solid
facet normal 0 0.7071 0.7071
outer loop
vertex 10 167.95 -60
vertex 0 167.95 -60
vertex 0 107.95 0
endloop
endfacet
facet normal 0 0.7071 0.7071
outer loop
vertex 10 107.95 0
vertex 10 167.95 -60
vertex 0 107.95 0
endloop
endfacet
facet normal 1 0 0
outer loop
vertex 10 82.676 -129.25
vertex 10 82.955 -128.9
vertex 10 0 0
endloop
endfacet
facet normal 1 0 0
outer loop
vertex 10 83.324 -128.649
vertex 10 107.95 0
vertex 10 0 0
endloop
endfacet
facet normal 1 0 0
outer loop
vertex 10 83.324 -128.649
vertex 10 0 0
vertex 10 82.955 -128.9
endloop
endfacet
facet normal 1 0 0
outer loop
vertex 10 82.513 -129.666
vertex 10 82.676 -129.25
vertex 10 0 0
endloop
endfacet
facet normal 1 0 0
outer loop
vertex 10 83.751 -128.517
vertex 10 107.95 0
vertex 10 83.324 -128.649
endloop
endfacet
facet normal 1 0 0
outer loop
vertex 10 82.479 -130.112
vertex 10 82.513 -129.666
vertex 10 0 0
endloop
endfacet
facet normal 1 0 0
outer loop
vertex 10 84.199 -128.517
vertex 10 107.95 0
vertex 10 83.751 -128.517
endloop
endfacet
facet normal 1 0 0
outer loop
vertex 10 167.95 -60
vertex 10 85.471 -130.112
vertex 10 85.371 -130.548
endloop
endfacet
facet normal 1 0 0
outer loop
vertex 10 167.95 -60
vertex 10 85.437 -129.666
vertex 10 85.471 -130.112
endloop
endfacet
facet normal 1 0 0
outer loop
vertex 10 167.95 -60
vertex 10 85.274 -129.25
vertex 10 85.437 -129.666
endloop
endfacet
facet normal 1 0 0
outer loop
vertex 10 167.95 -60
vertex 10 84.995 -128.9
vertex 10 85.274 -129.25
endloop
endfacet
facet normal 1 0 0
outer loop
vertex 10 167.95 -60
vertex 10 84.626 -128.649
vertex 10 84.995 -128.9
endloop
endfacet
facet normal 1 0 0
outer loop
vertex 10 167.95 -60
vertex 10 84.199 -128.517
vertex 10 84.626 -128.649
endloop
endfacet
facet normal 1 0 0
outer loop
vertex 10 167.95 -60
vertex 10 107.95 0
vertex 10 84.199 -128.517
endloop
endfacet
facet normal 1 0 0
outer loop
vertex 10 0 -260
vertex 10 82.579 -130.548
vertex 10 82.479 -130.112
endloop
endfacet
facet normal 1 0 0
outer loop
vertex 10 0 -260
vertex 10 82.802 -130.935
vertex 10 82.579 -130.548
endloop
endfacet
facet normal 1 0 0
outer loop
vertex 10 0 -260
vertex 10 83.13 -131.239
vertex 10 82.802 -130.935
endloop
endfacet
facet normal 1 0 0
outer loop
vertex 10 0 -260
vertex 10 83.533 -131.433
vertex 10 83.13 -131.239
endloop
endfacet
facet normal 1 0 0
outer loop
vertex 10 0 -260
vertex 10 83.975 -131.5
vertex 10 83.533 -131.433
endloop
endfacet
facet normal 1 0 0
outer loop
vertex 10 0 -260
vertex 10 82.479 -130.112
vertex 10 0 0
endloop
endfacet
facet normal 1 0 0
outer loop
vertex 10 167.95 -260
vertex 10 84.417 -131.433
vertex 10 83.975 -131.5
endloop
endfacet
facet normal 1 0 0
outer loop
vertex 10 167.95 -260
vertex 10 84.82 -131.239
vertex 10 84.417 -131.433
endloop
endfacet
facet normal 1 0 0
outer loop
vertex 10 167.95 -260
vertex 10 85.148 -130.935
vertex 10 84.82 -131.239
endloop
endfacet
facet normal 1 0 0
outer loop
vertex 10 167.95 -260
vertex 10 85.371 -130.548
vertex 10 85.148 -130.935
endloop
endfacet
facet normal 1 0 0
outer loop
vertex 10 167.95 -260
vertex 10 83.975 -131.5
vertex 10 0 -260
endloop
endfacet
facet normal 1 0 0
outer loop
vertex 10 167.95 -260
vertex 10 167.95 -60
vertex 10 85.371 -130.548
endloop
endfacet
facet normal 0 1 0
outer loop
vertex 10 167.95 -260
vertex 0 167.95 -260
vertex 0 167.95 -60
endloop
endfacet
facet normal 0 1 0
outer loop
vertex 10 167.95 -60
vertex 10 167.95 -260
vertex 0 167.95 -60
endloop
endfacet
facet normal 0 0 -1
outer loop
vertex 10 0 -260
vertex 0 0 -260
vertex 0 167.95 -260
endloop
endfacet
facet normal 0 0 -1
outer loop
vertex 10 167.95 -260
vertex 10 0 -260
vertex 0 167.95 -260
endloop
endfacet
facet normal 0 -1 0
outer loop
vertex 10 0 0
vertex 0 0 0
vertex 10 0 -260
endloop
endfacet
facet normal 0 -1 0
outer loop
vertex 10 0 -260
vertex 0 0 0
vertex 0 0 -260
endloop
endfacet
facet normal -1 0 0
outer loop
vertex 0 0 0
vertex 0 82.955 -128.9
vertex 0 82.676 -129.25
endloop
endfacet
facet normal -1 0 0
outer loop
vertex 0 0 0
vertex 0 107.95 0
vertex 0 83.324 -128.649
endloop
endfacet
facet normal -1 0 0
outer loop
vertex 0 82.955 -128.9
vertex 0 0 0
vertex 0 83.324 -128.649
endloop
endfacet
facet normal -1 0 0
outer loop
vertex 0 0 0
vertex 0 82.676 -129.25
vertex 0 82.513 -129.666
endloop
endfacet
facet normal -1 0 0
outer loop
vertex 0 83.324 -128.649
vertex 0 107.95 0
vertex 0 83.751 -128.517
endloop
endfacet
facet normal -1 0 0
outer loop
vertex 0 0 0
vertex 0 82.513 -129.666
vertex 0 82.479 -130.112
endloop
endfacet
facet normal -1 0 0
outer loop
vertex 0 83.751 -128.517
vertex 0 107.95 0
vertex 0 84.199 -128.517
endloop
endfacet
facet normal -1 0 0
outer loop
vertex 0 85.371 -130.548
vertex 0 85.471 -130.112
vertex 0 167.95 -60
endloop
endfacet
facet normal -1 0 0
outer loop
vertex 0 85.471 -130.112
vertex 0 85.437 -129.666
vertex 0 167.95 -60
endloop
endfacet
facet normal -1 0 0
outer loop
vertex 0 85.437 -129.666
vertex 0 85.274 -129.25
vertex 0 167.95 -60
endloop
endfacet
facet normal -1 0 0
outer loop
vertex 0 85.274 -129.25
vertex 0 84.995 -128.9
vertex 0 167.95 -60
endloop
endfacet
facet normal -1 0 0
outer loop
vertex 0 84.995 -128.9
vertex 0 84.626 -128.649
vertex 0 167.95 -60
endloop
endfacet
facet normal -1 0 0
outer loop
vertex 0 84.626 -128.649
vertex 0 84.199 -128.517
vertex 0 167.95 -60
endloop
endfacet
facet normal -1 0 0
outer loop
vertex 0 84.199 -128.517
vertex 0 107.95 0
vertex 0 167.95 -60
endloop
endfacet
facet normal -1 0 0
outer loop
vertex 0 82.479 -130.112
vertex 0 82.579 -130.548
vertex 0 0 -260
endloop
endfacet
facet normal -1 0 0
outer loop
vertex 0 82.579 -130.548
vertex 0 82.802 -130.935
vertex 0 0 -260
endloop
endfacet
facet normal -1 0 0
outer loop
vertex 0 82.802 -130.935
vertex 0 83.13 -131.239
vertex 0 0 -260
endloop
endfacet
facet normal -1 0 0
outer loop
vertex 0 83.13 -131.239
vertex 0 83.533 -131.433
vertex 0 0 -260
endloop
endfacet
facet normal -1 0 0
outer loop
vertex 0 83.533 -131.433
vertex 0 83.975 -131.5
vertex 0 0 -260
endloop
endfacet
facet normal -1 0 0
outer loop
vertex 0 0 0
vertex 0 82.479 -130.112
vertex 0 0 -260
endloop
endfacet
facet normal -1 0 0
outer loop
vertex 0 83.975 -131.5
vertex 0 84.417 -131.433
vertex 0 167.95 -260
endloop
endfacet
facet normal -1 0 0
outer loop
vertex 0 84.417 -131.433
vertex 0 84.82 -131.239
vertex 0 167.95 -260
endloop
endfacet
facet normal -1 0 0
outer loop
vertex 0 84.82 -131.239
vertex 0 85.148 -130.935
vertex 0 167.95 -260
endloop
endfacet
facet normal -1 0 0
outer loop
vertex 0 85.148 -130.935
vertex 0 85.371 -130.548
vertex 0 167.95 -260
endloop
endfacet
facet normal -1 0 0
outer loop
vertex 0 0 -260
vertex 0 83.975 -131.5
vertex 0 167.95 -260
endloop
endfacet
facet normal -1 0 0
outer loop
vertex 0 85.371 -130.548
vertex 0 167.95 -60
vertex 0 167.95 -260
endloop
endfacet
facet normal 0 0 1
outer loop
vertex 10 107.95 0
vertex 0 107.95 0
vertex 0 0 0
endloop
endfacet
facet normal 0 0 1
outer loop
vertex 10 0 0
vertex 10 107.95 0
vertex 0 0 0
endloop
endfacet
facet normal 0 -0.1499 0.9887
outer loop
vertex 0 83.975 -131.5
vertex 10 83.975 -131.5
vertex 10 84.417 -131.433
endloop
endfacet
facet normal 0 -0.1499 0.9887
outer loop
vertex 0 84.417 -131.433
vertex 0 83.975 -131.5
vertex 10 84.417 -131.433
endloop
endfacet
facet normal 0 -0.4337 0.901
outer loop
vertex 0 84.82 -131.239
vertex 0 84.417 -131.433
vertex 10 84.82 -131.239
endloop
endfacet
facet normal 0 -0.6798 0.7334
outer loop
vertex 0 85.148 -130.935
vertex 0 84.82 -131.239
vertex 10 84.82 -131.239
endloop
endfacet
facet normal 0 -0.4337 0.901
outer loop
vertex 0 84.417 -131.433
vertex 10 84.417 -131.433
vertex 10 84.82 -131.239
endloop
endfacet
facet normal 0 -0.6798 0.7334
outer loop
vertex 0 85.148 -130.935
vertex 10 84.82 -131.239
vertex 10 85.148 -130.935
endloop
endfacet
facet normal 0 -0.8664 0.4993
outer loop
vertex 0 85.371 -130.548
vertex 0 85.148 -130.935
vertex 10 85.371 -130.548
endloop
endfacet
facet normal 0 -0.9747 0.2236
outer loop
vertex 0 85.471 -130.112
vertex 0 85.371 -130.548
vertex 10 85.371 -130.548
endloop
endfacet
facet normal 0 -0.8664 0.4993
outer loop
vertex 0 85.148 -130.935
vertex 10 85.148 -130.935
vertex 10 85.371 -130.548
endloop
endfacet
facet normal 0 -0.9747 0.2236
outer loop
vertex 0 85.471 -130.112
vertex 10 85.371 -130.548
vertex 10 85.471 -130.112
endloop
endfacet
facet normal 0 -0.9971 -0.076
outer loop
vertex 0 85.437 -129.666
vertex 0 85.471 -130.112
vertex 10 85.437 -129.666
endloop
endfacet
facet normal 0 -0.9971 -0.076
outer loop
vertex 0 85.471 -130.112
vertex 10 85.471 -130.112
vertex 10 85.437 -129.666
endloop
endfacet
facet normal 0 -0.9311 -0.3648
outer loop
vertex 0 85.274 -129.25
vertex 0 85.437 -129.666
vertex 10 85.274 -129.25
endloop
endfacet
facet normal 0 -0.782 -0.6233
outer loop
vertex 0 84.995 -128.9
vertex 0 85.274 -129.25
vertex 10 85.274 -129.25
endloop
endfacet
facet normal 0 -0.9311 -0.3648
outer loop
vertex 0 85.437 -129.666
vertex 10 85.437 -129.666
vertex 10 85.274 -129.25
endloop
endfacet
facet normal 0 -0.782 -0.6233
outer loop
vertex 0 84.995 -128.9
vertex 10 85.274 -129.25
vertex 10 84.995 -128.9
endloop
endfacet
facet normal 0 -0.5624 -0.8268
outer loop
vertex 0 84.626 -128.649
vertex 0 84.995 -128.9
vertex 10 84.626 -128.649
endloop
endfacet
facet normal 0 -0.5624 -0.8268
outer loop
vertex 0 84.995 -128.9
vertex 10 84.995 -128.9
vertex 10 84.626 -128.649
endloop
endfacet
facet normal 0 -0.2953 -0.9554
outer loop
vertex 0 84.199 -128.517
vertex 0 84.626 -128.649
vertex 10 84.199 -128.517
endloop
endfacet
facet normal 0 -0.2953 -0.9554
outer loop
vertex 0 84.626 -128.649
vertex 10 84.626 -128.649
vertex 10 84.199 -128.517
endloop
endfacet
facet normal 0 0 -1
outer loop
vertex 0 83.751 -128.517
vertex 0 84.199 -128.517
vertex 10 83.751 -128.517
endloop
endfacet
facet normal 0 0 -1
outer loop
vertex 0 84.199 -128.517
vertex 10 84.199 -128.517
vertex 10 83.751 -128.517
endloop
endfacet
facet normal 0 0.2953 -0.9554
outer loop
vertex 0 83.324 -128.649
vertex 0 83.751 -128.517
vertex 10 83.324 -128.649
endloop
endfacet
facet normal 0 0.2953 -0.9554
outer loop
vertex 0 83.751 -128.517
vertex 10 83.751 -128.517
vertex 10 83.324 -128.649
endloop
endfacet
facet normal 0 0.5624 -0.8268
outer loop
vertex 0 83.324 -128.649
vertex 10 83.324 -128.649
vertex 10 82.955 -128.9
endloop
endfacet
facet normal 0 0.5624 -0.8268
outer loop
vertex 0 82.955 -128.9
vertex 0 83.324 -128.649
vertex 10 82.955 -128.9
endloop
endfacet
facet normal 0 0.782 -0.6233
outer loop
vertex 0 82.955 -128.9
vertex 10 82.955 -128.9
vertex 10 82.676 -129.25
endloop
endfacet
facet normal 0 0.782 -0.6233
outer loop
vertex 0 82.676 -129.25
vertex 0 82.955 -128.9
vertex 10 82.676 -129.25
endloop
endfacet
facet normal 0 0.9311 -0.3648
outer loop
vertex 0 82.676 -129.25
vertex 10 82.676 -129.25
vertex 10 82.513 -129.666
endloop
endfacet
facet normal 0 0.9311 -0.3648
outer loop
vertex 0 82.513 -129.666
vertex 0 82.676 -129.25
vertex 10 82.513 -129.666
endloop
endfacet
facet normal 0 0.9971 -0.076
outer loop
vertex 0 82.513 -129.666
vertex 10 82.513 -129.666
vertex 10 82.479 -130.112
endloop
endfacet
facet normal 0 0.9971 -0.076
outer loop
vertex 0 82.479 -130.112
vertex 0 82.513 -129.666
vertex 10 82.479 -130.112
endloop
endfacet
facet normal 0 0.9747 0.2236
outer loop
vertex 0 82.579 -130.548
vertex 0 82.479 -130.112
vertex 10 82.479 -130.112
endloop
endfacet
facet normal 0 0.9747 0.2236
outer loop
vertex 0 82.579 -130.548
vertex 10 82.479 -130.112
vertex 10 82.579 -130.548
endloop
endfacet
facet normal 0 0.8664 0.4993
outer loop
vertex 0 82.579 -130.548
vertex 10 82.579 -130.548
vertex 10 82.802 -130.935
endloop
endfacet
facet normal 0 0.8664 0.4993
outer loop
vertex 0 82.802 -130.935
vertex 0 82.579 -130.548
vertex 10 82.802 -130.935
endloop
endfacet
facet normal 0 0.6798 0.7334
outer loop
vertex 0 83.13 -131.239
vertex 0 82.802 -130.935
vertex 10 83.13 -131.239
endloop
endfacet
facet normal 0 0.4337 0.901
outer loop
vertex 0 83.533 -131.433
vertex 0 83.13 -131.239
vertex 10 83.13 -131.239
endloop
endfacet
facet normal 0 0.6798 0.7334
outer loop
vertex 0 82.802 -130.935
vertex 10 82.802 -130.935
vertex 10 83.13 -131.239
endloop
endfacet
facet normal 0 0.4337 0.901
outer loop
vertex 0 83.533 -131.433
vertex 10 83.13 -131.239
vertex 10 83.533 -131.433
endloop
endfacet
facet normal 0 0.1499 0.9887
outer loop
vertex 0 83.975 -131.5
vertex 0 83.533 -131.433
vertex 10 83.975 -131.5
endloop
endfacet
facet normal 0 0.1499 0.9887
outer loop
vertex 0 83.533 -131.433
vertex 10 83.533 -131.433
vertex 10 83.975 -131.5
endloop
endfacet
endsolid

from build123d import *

# Parameters (mm, degrees)
Y_KSEKLIK_EKSTR_ZYON1_DEPTH = 10
SKETCH3_R                   = 1.5
CUT_EXTRUDE1_DEPTH          = 10


with BuildPart() as part:
    # Çizim1 → Yükseklik-Ekstrüzyon1 (new body)
    with BuildSketch(Plane(origin=(0, 0, 0), x_dir=(0, 0, -1), z_dir=(1, 0, 0))):
        Polygon((0, 0), (260, 0), (260, 167.95), (60, 167.95), (0, 107.95), align=None)
    extrude(amount=Y_KSEKLIK_EKSTR_ZYON1_DEPTH)

    # Sketch3 → Cut-Extrude1 (cut)
    with BuildSketch(Plane(origin=(10, 0, 0), x_dir=(0, 0, -1), z_dir=(1, 0, 0))):
        with Locations((130, 83.975)):
            Circle(SKETCH3_R)
    extrude(amount=-CUT_EXTRUDE1_DEPTH, mode=Mode.SUBTRACT)


solid = part.part
